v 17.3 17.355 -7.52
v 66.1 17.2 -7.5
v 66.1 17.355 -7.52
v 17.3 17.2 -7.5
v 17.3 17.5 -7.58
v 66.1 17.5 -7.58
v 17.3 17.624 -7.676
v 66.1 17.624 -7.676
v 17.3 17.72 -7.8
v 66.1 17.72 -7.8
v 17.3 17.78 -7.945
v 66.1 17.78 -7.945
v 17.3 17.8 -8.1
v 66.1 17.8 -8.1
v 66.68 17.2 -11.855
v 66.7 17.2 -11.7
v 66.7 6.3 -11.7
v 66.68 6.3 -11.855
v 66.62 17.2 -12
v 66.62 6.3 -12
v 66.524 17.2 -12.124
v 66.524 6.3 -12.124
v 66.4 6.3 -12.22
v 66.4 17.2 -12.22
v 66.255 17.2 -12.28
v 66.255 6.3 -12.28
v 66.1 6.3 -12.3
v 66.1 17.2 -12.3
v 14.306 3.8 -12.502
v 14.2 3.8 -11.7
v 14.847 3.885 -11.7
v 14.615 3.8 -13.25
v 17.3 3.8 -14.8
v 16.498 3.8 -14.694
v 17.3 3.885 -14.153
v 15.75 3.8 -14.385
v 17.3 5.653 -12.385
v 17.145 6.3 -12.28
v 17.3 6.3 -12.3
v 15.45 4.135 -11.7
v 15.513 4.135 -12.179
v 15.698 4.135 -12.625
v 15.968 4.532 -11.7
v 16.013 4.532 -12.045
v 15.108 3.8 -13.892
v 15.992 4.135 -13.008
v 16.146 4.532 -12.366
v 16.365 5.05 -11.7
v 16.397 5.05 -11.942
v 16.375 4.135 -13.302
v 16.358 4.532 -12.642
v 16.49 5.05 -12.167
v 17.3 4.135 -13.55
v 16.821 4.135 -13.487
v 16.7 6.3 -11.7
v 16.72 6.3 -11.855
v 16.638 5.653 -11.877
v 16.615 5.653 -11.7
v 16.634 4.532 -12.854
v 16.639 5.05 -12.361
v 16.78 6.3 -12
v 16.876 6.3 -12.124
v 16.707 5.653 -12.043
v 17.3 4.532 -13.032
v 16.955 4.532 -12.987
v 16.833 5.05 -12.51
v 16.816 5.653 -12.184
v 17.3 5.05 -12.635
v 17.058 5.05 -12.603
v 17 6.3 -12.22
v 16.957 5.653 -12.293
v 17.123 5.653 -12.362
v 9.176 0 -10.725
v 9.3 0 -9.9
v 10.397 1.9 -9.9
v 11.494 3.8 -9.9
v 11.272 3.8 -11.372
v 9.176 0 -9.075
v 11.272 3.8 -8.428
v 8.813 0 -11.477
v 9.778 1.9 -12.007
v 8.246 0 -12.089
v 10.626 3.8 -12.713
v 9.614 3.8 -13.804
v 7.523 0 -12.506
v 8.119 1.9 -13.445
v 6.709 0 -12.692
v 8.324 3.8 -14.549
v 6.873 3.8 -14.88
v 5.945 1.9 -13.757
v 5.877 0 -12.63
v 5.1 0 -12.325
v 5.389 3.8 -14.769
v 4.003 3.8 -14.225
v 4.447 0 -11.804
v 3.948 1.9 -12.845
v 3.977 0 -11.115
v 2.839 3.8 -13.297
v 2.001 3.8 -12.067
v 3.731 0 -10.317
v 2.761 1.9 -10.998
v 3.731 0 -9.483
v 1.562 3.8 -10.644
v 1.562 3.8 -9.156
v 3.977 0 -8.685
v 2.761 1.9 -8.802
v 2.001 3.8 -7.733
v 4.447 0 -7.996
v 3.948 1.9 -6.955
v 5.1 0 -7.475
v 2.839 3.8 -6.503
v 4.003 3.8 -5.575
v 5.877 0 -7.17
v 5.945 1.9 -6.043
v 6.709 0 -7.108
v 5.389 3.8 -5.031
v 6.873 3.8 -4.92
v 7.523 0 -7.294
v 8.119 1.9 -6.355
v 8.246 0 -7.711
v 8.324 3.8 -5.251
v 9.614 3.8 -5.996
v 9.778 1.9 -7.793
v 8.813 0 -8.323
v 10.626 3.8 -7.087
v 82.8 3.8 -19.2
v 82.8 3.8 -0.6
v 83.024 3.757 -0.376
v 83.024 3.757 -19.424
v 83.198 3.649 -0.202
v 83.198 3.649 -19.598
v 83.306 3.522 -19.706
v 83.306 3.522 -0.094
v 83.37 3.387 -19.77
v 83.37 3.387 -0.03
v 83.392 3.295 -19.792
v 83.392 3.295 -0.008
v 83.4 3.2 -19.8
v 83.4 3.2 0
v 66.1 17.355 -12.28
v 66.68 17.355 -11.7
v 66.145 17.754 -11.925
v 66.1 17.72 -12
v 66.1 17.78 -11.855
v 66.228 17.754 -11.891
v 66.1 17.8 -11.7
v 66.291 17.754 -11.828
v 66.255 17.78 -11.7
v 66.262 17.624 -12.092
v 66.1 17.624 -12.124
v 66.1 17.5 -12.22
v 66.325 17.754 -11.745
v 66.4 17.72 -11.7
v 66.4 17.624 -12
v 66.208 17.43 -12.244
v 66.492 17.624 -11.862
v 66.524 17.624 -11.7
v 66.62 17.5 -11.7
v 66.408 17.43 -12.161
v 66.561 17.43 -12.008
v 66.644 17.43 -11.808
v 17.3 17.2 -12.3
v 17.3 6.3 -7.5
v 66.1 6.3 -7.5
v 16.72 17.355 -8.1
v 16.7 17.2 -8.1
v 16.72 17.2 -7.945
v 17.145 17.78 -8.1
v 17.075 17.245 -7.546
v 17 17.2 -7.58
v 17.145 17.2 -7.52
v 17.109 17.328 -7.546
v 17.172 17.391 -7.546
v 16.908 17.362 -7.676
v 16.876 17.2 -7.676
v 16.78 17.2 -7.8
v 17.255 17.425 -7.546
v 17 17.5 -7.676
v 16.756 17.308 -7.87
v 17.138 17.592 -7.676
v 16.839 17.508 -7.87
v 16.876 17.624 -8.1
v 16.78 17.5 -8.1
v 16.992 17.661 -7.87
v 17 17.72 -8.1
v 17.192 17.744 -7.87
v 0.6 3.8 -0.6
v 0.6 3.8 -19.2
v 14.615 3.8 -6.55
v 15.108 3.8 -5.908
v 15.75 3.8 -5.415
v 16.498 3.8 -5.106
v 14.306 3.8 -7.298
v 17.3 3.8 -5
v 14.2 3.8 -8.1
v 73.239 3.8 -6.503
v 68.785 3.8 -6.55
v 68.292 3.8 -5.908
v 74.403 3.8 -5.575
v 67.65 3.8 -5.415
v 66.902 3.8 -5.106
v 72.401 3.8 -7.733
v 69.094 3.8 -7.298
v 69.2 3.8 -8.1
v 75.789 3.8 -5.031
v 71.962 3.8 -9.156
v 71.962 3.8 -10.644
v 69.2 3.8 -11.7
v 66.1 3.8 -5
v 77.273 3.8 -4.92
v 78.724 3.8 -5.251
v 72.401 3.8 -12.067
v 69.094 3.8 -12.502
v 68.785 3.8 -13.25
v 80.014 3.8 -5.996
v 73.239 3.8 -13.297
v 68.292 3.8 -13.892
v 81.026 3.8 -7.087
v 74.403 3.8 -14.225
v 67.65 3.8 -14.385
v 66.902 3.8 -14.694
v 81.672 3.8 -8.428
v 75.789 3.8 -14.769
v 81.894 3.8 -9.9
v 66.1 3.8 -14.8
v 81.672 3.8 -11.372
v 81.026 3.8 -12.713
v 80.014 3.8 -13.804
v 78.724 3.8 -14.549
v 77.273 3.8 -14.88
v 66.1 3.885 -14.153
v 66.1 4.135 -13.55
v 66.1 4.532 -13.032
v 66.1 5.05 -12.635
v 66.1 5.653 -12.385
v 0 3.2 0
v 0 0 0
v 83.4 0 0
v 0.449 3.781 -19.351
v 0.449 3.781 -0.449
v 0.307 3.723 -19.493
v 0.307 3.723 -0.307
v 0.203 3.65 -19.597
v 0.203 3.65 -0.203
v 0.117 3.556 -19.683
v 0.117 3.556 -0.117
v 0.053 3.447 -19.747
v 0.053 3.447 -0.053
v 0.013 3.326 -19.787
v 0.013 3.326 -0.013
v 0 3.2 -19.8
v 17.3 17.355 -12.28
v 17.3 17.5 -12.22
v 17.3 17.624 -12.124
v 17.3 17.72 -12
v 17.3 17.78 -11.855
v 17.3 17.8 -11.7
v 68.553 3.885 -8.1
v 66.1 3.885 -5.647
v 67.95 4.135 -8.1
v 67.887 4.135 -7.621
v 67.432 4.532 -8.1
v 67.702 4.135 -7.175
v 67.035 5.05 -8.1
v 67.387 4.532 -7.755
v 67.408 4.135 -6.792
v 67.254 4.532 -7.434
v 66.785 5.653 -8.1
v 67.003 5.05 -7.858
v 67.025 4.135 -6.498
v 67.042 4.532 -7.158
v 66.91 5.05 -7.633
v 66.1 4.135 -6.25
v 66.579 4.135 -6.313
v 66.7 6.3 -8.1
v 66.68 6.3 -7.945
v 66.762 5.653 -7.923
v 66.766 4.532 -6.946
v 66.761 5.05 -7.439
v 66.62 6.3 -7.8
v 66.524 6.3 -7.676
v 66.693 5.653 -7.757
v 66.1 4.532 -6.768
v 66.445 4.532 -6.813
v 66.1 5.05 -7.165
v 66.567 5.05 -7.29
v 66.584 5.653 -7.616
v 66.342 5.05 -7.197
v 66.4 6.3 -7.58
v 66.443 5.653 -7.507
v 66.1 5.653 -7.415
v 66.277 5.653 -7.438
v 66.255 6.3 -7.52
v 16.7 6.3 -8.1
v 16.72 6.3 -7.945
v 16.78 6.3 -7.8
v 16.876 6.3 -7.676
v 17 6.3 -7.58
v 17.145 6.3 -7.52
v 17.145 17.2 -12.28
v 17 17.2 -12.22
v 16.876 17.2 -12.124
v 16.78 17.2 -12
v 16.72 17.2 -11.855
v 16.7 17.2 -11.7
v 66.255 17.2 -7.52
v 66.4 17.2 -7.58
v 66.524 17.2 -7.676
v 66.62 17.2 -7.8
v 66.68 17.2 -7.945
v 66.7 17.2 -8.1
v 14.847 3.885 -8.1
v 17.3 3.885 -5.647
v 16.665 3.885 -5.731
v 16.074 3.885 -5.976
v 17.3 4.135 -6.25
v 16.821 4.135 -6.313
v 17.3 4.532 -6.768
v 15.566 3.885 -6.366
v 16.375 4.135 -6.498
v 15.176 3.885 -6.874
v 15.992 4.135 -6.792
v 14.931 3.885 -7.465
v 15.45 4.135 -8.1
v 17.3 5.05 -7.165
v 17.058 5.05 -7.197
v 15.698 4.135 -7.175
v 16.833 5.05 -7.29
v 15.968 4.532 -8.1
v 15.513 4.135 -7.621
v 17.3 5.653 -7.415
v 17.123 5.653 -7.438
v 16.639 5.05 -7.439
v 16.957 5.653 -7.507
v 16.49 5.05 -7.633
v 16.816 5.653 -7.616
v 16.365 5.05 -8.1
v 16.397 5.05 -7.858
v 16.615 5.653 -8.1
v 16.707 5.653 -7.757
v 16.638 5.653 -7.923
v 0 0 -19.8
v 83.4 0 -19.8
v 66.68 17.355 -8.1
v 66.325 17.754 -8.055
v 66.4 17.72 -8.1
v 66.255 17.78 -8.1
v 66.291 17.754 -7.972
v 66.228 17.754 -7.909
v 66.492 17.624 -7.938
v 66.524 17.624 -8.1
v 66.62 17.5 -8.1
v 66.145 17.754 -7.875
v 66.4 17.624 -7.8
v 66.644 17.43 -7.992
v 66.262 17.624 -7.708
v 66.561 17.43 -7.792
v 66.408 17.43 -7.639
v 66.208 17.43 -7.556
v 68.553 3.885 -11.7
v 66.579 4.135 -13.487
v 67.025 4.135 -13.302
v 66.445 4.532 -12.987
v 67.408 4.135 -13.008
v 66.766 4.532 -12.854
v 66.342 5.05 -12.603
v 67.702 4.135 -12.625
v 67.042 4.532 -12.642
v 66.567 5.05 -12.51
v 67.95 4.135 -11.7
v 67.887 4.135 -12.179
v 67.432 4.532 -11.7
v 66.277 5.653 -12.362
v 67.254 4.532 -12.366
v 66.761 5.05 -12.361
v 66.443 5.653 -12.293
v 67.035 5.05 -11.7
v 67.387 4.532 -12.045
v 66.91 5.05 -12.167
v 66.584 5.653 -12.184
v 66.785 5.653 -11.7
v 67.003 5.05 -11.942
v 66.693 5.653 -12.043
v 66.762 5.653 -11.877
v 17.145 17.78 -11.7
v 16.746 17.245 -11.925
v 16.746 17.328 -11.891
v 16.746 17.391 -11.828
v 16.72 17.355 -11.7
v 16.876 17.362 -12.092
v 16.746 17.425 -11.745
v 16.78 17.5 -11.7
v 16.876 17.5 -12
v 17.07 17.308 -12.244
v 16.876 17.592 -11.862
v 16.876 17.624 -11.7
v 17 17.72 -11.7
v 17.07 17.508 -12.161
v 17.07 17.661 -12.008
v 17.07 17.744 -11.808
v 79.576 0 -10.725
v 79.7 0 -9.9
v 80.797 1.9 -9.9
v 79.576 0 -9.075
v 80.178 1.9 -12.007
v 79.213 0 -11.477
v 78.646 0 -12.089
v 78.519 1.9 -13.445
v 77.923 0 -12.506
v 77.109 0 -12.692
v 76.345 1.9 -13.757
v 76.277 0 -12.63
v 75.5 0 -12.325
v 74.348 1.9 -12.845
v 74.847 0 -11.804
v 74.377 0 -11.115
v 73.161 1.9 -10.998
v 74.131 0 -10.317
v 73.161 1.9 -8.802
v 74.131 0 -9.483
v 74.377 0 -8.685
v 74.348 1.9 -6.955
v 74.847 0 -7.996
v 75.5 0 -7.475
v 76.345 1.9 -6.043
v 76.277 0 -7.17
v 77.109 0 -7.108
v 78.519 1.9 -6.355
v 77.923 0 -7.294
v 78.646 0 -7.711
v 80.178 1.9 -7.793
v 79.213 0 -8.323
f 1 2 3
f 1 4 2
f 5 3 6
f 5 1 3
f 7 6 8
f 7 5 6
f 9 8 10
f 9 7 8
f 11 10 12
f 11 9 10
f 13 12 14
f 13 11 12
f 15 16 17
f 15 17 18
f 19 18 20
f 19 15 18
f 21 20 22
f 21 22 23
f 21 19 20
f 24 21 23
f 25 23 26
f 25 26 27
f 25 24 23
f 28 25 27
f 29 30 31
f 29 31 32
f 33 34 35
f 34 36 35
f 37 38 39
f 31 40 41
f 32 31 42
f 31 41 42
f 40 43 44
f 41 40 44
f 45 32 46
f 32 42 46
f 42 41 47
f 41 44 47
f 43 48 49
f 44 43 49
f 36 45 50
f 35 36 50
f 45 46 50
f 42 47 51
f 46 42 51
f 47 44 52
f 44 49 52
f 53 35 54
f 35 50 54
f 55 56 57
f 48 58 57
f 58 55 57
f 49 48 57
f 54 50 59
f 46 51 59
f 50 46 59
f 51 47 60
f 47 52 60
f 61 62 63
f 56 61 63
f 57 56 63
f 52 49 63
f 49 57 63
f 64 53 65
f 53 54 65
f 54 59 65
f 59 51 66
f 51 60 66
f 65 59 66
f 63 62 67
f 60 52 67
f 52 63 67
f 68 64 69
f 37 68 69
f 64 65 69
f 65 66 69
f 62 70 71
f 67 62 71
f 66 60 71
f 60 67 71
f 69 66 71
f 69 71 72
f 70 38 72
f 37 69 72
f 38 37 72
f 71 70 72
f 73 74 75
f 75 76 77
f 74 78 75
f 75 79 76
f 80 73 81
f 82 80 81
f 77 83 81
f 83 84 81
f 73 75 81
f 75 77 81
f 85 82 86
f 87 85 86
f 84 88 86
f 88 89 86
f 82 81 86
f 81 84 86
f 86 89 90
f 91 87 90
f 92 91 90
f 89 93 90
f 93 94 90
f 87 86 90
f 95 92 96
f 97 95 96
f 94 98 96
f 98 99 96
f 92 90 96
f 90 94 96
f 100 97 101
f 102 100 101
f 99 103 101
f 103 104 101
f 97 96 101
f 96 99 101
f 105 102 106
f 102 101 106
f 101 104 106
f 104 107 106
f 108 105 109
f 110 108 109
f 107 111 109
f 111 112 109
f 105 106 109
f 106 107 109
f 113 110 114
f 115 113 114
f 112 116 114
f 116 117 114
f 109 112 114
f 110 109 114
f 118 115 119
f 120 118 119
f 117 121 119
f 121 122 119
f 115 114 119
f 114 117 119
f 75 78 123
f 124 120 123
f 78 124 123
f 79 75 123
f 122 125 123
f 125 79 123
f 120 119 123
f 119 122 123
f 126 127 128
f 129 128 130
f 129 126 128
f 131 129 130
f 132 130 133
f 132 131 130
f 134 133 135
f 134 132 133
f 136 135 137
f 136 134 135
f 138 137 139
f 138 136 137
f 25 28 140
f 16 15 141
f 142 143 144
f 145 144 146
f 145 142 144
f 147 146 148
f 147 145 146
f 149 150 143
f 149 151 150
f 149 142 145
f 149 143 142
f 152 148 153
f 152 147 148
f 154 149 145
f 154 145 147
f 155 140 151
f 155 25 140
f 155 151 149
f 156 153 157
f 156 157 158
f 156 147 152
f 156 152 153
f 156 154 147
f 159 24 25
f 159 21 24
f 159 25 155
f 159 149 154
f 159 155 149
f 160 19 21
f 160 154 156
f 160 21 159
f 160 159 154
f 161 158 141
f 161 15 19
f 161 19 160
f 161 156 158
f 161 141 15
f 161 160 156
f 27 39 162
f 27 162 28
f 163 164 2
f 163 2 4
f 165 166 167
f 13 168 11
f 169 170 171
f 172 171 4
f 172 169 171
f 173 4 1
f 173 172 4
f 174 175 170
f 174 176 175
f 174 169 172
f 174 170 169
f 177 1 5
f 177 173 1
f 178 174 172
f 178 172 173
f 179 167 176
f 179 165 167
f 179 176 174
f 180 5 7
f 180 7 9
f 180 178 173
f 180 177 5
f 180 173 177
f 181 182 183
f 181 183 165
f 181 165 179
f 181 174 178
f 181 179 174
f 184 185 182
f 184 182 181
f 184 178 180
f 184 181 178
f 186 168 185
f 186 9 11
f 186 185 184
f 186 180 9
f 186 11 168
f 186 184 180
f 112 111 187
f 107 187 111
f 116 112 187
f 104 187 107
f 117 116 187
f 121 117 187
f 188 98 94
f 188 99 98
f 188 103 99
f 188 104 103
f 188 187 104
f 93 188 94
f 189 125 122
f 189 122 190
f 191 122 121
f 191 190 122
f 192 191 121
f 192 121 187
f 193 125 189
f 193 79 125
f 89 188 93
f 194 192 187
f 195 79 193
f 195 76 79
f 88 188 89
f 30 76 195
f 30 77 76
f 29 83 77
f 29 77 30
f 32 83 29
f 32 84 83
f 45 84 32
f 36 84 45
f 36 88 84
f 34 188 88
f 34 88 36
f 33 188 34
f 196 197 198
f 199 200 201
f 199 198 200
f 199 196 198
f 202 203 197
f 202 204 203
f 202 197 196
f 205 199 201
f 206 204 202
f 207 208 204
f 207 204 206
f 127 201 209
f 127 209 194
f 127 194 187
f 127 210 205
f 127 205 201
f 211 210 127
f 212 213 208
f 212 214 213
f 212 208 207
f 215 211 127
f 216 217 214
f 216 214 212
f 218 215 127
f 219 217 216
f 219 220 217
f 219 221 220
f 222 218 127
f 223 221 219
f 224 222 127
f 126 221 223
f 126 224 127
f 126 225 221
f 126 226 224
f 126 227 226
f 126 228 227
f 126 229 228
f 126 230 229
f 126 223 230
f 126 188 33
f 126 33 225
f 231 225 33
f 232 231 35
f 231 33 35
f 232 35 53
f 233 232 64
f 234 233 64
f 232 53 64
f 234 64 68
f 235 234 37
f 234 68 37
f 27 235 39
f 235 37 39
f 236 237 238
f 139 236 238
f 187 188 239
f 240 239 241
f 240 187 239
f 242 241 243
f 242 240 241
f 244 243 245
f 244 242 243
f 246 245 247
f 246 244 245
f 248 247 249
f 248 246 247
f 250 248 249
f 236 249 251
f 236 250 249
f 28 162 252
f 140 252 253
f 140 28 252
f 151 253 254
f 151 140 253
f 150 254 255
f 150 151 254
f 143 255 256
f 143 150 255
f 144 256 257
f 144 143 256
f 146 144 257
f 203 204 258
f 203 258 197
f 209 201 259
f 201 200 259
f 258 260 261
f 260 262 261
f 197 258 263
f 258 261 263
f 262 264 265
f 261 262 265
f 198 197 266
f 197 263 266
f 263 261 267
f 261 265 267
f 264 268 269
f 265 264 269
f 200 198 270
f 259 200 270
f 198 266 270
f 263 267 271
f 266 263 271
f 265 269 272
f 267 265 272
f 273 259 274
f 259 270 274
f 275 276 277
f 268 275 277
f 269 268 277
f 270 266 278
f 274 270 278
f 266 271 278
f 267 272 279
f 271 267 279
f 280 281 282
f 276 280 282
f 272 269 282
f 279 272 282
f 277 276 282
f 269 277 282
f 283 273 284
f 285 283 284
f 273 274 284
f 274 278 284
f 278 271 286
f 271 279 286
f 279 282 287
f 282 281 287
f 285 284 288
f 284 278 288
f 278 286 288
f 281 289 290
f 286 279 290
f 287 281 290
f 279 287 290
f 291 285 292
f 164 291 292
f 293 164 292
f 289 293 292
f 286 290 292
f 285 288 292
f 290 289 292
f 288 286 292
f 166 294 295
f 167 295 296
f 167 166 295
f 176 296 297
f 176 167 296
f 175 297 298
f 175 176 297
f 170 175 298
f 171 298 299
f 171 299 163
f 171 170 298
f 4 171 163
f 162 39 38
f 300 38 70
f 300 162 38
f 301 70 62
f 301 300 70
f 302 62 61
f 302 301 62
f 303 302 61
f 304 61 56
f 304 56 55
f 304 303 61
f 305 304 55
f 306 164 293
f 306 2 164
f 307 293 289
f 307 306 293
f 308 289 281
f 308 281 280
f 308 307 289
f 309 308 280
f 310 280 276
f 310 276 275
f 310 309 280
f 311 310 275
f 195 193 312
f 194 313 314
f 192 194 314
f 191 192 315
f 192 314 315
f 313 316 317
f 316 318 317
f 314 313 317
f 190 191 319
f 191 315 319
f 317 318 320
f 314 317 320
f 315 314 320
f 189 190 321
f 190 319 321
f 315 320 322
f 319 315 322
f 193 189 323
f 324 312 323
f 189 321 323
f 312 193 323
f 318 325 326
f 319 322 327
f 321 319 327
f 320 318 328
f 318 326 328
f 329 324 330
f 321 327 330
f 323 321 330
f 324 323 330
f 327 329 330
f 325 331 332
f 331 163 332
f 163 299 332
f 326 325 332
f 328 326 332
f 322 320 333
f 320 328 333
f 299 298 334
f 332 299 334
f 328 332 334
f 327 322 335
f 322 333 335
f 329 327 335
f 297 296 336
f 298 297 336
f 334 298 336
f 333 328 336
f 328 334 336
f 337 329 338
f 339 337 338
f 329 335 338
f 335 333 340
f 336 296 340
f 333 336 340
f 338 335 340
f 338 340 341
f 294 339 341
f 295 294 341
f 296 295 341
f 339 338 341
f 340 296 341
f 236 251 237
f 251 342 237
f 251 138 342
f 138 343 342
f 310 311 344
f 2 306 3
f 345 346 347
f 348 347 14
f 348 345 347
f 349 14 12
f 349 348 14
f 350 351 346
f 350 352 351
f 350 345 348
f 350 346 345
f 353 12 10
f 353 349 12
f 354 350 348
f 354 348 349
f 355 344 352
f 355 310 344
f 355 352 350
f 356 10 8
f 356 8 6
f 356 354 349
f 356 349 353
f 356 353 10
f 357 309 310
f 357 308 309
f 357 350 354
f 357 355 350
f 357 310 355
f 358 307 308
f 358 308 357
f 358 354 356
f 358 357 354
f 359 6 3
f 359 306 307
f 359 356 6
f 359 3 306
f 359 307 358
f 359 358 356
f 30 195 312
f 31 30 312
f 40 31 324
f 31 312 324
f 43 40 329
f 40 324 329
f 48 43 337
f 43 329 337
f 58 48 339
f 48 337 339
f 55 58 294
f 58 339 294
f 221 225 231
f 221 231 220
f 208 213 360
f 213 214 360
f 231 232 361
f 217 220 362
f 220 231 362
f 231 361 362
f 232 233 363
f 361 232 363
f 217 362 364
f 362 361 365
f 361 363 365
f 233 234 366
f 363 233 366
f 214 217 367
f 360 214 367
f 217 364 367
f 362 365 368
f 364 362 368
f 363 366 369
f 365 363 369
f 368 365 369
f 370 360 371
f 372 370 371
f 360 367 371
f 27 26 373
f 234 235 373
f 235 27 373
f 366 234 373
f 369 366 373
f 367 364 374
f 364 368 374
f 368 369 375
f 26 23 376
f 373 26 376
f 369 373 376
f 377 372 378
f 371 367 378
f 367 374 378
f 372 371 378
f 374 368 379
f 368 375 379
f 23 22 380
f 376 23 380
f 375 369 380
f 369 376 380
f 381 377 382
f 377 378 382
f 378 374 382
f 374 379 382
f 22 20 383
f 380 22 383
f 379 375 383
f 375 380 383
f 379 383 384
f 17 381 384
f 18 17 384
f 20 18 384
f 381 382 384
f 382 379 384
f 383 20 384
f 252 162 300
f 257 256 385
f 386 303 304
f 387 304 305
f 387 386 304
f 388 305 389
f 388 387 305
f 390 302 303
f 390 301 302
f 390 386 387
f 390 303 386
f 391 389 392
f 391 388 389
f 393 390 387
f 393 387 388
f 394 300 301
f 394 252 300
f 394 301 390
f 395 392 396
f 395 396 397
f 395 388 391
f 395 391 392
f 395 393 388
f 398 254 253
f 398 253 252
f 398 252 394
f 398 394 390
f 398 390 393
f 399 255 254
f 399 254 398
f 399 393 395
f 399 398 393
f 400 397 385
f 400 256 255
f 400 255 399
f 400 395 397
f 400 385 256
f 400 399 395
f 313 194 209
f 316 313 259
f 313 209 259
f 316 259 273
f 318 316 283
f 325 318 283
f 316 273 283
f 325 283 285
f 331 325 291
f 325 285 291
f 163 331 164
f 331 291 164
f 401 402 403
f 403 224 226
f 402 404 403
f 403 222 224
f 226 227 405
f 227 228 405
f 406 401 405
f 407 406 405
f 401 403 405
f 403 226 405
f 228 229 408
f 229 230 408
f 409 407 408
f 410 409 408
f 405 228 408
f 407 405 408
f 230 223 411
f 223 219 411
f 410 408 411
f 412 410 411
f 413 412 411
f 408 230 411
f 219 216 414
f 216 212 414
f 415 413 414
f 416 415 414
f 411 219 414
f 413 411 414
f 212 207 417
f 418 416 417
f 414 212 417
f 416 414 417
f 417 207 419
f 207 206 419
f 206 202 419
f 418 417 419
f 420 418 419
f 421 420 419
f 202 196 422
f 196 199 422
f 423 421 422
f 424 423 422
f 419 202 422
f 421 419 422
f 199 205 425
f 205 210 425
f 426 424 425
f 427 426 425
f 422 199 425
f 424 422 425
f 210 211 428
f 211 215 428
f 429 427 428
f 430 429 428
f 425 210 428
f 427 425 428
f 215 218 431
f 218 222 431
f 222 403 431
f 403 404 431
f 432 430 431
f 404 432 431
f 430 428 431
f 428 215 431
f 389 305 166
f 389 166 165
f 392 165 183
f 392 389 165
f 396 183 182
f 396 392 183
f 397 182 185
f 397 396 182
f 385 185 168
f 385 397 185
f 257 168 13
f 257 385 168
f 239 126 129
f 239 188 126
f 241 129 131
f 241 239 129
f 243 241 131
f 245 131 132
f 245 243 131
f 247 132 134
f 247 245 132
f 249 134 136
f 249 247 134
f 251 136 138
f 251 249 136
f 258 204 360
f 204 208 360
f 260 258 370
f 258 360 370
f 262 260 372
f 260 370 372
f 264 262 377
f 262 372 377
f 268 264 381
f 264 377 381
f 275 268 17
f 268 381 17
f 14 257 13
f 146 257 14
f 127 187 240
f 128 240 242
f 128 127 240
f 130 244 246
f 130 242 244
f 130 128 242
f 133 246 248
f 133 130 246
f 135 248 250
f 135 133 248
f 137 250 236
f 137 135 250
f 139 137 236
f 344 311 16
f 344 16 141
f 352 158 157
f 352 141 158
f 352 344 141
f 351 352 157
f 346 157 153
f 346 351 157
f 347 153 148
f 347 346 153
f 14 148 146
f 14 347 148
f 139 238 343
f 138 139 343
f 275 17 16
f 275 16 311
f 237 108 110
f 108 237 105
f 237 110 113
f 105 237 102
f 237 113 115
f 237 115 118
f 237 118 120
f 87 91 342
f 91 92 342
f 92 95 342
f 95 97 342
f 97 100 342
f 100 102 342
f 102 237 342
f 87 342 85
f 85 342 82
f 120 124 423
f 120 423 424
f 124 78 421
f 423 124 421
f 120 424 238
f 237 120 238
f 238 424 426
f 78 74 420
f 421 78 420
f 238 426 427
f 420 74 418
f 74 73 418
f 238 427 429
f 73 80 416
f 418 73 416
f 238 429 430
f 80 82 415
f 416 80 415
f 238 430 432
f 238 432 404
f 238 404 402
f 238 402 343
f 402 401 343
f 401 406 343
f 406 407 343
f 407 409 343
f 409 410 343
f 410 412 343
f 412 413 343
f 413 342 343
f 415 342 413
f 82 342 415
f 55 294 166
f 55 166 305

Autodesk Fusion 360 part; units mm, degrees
sketch "Sketch1" plane through (0, 0, 0) normal (0, 1, 0) x (1, 0, 0)
  line L0 (0, 0) -> (83.4, 0)
  line L1 (83.4, 0) -> (83.4, 19.8)
  line L2 (83.4, 19.8) -> (0, 19.8)
  line L3 (0, 19.8) -> (0, 0)
  circle A0 centre (6.5, 9.9) radius 5
  circle A1 centre (76.9, 9.9) radius 5
  line L4 (16.7, 12.3) -> (66.7, 12.3)
  line L5 (66.7, 12.3) -> (66.7, 7.5)
  line L6 (66.7, 7.5) -> (16.7, 7.5)
  line L7 (16.7, 7.5) -> (16.7, 12.3)
  circle A2 centre (76.9, 9.9) radius 2.8
  circle A3 centre (6.5, 9.9) radius 2.8
  point P0 (66.7, 9.9)
  point P1 (83.4, 9.9)
  point P2 (41.7, 12.3)
  point P3 (41.7, 19.8)
  dimension "d1" = 83.4
  dimension "d2" = 19.8
  dimension "d3" = 10
  dimension "d4" = 6.5
  dimension "d5" = 10
  dimension "d6" = 6.5
  dimension "d7" = 50
  dimension "d9" = 4.8
  dimension "d18" = 5.6
  dimension "d19" = 5.6
extrude "Extrude1" add sketch "Sketch1" along normal blind 17.8 contours L4 L5 L6 L7 makes body 1
extrude "Extrude2" add sketch "Sketch1" along normal blind 3.8 separate body contours L0 L1 L2 L3 makes body 2
extrude "Extrude3" add sketch "Sketch1" along normal blind 3.8 separate body contours A0 | A1 | A2 | A3 makes body 3 at (81.8938, 1.2667, -9.6508) makes body 4 at (11.4752, 2.5333, -9.4022)
extrude "Extrude4" cut sketch "Sketch1" along normal blind 3.8 draft 30 contours A2 | A3 bodies 3 4
combine "Combine1" operation add target body 2 tool bodies 1
combine "Combine2" operation add target body 2 tool bodies 3 4
fillet "Fillet1" radius 0.6 12 edges at (66.7, 10.8, -12.3) (66.7, 10.8, -7.5) (41.7, 17.8, -12.3) (83.4, 3.8, -9.9) (41.7, 3.8, -19.8) (41.7, 3.8, 0) (66.7, 17.8, -9.9) (16.7, 17.8, -9.9) (0, 3.8, -9.9) (41.7, 17.8, -7.5) (16.7, 10.8, -7.5) (16.7, 10.8, -12.3) on bodies 2
fillet "Fillet2" radius 2.5 8 edges at (66.5243, 3.8, -12.1243) (66.7, 3.8, -9.9) (66.5243, 3.8, -7.6757) (41.7, 3.8, -7.5) (16.8757, 3.8, -7.6757) (16.7, 3.8, -9.9) (16.8757, 3.8, -12.1243) (41.7, 3.8, -12.3) on bodies 2
equation "d3 = screw_top_opening_width"
equation "d5 = screw_top_opening_width"
equation "plate_height = 3.8 mm"
equation "d14 = 14 mm + plate_height"
equation "d16 = plate_height"
equation "d18 = screw_bottom_opening_width"
equation "d19 = screw_bottom_opening_width"
equation "screw_top_opening_width = 10 mm"
equation "screw_bottom_opening_width = 5.6 mm"
equation "d22 = plate_height"
equation "d24 = plate_height"
equation "screw_taper_angle = 30 deg"
equation "outside_fillet_radiu = 0.6 mm"
equation "d29 = outside_fillet_radiu"
equation "inside_fillet_radius = 2.5 mm"
equation "d32 = inside_fillet_radius"
